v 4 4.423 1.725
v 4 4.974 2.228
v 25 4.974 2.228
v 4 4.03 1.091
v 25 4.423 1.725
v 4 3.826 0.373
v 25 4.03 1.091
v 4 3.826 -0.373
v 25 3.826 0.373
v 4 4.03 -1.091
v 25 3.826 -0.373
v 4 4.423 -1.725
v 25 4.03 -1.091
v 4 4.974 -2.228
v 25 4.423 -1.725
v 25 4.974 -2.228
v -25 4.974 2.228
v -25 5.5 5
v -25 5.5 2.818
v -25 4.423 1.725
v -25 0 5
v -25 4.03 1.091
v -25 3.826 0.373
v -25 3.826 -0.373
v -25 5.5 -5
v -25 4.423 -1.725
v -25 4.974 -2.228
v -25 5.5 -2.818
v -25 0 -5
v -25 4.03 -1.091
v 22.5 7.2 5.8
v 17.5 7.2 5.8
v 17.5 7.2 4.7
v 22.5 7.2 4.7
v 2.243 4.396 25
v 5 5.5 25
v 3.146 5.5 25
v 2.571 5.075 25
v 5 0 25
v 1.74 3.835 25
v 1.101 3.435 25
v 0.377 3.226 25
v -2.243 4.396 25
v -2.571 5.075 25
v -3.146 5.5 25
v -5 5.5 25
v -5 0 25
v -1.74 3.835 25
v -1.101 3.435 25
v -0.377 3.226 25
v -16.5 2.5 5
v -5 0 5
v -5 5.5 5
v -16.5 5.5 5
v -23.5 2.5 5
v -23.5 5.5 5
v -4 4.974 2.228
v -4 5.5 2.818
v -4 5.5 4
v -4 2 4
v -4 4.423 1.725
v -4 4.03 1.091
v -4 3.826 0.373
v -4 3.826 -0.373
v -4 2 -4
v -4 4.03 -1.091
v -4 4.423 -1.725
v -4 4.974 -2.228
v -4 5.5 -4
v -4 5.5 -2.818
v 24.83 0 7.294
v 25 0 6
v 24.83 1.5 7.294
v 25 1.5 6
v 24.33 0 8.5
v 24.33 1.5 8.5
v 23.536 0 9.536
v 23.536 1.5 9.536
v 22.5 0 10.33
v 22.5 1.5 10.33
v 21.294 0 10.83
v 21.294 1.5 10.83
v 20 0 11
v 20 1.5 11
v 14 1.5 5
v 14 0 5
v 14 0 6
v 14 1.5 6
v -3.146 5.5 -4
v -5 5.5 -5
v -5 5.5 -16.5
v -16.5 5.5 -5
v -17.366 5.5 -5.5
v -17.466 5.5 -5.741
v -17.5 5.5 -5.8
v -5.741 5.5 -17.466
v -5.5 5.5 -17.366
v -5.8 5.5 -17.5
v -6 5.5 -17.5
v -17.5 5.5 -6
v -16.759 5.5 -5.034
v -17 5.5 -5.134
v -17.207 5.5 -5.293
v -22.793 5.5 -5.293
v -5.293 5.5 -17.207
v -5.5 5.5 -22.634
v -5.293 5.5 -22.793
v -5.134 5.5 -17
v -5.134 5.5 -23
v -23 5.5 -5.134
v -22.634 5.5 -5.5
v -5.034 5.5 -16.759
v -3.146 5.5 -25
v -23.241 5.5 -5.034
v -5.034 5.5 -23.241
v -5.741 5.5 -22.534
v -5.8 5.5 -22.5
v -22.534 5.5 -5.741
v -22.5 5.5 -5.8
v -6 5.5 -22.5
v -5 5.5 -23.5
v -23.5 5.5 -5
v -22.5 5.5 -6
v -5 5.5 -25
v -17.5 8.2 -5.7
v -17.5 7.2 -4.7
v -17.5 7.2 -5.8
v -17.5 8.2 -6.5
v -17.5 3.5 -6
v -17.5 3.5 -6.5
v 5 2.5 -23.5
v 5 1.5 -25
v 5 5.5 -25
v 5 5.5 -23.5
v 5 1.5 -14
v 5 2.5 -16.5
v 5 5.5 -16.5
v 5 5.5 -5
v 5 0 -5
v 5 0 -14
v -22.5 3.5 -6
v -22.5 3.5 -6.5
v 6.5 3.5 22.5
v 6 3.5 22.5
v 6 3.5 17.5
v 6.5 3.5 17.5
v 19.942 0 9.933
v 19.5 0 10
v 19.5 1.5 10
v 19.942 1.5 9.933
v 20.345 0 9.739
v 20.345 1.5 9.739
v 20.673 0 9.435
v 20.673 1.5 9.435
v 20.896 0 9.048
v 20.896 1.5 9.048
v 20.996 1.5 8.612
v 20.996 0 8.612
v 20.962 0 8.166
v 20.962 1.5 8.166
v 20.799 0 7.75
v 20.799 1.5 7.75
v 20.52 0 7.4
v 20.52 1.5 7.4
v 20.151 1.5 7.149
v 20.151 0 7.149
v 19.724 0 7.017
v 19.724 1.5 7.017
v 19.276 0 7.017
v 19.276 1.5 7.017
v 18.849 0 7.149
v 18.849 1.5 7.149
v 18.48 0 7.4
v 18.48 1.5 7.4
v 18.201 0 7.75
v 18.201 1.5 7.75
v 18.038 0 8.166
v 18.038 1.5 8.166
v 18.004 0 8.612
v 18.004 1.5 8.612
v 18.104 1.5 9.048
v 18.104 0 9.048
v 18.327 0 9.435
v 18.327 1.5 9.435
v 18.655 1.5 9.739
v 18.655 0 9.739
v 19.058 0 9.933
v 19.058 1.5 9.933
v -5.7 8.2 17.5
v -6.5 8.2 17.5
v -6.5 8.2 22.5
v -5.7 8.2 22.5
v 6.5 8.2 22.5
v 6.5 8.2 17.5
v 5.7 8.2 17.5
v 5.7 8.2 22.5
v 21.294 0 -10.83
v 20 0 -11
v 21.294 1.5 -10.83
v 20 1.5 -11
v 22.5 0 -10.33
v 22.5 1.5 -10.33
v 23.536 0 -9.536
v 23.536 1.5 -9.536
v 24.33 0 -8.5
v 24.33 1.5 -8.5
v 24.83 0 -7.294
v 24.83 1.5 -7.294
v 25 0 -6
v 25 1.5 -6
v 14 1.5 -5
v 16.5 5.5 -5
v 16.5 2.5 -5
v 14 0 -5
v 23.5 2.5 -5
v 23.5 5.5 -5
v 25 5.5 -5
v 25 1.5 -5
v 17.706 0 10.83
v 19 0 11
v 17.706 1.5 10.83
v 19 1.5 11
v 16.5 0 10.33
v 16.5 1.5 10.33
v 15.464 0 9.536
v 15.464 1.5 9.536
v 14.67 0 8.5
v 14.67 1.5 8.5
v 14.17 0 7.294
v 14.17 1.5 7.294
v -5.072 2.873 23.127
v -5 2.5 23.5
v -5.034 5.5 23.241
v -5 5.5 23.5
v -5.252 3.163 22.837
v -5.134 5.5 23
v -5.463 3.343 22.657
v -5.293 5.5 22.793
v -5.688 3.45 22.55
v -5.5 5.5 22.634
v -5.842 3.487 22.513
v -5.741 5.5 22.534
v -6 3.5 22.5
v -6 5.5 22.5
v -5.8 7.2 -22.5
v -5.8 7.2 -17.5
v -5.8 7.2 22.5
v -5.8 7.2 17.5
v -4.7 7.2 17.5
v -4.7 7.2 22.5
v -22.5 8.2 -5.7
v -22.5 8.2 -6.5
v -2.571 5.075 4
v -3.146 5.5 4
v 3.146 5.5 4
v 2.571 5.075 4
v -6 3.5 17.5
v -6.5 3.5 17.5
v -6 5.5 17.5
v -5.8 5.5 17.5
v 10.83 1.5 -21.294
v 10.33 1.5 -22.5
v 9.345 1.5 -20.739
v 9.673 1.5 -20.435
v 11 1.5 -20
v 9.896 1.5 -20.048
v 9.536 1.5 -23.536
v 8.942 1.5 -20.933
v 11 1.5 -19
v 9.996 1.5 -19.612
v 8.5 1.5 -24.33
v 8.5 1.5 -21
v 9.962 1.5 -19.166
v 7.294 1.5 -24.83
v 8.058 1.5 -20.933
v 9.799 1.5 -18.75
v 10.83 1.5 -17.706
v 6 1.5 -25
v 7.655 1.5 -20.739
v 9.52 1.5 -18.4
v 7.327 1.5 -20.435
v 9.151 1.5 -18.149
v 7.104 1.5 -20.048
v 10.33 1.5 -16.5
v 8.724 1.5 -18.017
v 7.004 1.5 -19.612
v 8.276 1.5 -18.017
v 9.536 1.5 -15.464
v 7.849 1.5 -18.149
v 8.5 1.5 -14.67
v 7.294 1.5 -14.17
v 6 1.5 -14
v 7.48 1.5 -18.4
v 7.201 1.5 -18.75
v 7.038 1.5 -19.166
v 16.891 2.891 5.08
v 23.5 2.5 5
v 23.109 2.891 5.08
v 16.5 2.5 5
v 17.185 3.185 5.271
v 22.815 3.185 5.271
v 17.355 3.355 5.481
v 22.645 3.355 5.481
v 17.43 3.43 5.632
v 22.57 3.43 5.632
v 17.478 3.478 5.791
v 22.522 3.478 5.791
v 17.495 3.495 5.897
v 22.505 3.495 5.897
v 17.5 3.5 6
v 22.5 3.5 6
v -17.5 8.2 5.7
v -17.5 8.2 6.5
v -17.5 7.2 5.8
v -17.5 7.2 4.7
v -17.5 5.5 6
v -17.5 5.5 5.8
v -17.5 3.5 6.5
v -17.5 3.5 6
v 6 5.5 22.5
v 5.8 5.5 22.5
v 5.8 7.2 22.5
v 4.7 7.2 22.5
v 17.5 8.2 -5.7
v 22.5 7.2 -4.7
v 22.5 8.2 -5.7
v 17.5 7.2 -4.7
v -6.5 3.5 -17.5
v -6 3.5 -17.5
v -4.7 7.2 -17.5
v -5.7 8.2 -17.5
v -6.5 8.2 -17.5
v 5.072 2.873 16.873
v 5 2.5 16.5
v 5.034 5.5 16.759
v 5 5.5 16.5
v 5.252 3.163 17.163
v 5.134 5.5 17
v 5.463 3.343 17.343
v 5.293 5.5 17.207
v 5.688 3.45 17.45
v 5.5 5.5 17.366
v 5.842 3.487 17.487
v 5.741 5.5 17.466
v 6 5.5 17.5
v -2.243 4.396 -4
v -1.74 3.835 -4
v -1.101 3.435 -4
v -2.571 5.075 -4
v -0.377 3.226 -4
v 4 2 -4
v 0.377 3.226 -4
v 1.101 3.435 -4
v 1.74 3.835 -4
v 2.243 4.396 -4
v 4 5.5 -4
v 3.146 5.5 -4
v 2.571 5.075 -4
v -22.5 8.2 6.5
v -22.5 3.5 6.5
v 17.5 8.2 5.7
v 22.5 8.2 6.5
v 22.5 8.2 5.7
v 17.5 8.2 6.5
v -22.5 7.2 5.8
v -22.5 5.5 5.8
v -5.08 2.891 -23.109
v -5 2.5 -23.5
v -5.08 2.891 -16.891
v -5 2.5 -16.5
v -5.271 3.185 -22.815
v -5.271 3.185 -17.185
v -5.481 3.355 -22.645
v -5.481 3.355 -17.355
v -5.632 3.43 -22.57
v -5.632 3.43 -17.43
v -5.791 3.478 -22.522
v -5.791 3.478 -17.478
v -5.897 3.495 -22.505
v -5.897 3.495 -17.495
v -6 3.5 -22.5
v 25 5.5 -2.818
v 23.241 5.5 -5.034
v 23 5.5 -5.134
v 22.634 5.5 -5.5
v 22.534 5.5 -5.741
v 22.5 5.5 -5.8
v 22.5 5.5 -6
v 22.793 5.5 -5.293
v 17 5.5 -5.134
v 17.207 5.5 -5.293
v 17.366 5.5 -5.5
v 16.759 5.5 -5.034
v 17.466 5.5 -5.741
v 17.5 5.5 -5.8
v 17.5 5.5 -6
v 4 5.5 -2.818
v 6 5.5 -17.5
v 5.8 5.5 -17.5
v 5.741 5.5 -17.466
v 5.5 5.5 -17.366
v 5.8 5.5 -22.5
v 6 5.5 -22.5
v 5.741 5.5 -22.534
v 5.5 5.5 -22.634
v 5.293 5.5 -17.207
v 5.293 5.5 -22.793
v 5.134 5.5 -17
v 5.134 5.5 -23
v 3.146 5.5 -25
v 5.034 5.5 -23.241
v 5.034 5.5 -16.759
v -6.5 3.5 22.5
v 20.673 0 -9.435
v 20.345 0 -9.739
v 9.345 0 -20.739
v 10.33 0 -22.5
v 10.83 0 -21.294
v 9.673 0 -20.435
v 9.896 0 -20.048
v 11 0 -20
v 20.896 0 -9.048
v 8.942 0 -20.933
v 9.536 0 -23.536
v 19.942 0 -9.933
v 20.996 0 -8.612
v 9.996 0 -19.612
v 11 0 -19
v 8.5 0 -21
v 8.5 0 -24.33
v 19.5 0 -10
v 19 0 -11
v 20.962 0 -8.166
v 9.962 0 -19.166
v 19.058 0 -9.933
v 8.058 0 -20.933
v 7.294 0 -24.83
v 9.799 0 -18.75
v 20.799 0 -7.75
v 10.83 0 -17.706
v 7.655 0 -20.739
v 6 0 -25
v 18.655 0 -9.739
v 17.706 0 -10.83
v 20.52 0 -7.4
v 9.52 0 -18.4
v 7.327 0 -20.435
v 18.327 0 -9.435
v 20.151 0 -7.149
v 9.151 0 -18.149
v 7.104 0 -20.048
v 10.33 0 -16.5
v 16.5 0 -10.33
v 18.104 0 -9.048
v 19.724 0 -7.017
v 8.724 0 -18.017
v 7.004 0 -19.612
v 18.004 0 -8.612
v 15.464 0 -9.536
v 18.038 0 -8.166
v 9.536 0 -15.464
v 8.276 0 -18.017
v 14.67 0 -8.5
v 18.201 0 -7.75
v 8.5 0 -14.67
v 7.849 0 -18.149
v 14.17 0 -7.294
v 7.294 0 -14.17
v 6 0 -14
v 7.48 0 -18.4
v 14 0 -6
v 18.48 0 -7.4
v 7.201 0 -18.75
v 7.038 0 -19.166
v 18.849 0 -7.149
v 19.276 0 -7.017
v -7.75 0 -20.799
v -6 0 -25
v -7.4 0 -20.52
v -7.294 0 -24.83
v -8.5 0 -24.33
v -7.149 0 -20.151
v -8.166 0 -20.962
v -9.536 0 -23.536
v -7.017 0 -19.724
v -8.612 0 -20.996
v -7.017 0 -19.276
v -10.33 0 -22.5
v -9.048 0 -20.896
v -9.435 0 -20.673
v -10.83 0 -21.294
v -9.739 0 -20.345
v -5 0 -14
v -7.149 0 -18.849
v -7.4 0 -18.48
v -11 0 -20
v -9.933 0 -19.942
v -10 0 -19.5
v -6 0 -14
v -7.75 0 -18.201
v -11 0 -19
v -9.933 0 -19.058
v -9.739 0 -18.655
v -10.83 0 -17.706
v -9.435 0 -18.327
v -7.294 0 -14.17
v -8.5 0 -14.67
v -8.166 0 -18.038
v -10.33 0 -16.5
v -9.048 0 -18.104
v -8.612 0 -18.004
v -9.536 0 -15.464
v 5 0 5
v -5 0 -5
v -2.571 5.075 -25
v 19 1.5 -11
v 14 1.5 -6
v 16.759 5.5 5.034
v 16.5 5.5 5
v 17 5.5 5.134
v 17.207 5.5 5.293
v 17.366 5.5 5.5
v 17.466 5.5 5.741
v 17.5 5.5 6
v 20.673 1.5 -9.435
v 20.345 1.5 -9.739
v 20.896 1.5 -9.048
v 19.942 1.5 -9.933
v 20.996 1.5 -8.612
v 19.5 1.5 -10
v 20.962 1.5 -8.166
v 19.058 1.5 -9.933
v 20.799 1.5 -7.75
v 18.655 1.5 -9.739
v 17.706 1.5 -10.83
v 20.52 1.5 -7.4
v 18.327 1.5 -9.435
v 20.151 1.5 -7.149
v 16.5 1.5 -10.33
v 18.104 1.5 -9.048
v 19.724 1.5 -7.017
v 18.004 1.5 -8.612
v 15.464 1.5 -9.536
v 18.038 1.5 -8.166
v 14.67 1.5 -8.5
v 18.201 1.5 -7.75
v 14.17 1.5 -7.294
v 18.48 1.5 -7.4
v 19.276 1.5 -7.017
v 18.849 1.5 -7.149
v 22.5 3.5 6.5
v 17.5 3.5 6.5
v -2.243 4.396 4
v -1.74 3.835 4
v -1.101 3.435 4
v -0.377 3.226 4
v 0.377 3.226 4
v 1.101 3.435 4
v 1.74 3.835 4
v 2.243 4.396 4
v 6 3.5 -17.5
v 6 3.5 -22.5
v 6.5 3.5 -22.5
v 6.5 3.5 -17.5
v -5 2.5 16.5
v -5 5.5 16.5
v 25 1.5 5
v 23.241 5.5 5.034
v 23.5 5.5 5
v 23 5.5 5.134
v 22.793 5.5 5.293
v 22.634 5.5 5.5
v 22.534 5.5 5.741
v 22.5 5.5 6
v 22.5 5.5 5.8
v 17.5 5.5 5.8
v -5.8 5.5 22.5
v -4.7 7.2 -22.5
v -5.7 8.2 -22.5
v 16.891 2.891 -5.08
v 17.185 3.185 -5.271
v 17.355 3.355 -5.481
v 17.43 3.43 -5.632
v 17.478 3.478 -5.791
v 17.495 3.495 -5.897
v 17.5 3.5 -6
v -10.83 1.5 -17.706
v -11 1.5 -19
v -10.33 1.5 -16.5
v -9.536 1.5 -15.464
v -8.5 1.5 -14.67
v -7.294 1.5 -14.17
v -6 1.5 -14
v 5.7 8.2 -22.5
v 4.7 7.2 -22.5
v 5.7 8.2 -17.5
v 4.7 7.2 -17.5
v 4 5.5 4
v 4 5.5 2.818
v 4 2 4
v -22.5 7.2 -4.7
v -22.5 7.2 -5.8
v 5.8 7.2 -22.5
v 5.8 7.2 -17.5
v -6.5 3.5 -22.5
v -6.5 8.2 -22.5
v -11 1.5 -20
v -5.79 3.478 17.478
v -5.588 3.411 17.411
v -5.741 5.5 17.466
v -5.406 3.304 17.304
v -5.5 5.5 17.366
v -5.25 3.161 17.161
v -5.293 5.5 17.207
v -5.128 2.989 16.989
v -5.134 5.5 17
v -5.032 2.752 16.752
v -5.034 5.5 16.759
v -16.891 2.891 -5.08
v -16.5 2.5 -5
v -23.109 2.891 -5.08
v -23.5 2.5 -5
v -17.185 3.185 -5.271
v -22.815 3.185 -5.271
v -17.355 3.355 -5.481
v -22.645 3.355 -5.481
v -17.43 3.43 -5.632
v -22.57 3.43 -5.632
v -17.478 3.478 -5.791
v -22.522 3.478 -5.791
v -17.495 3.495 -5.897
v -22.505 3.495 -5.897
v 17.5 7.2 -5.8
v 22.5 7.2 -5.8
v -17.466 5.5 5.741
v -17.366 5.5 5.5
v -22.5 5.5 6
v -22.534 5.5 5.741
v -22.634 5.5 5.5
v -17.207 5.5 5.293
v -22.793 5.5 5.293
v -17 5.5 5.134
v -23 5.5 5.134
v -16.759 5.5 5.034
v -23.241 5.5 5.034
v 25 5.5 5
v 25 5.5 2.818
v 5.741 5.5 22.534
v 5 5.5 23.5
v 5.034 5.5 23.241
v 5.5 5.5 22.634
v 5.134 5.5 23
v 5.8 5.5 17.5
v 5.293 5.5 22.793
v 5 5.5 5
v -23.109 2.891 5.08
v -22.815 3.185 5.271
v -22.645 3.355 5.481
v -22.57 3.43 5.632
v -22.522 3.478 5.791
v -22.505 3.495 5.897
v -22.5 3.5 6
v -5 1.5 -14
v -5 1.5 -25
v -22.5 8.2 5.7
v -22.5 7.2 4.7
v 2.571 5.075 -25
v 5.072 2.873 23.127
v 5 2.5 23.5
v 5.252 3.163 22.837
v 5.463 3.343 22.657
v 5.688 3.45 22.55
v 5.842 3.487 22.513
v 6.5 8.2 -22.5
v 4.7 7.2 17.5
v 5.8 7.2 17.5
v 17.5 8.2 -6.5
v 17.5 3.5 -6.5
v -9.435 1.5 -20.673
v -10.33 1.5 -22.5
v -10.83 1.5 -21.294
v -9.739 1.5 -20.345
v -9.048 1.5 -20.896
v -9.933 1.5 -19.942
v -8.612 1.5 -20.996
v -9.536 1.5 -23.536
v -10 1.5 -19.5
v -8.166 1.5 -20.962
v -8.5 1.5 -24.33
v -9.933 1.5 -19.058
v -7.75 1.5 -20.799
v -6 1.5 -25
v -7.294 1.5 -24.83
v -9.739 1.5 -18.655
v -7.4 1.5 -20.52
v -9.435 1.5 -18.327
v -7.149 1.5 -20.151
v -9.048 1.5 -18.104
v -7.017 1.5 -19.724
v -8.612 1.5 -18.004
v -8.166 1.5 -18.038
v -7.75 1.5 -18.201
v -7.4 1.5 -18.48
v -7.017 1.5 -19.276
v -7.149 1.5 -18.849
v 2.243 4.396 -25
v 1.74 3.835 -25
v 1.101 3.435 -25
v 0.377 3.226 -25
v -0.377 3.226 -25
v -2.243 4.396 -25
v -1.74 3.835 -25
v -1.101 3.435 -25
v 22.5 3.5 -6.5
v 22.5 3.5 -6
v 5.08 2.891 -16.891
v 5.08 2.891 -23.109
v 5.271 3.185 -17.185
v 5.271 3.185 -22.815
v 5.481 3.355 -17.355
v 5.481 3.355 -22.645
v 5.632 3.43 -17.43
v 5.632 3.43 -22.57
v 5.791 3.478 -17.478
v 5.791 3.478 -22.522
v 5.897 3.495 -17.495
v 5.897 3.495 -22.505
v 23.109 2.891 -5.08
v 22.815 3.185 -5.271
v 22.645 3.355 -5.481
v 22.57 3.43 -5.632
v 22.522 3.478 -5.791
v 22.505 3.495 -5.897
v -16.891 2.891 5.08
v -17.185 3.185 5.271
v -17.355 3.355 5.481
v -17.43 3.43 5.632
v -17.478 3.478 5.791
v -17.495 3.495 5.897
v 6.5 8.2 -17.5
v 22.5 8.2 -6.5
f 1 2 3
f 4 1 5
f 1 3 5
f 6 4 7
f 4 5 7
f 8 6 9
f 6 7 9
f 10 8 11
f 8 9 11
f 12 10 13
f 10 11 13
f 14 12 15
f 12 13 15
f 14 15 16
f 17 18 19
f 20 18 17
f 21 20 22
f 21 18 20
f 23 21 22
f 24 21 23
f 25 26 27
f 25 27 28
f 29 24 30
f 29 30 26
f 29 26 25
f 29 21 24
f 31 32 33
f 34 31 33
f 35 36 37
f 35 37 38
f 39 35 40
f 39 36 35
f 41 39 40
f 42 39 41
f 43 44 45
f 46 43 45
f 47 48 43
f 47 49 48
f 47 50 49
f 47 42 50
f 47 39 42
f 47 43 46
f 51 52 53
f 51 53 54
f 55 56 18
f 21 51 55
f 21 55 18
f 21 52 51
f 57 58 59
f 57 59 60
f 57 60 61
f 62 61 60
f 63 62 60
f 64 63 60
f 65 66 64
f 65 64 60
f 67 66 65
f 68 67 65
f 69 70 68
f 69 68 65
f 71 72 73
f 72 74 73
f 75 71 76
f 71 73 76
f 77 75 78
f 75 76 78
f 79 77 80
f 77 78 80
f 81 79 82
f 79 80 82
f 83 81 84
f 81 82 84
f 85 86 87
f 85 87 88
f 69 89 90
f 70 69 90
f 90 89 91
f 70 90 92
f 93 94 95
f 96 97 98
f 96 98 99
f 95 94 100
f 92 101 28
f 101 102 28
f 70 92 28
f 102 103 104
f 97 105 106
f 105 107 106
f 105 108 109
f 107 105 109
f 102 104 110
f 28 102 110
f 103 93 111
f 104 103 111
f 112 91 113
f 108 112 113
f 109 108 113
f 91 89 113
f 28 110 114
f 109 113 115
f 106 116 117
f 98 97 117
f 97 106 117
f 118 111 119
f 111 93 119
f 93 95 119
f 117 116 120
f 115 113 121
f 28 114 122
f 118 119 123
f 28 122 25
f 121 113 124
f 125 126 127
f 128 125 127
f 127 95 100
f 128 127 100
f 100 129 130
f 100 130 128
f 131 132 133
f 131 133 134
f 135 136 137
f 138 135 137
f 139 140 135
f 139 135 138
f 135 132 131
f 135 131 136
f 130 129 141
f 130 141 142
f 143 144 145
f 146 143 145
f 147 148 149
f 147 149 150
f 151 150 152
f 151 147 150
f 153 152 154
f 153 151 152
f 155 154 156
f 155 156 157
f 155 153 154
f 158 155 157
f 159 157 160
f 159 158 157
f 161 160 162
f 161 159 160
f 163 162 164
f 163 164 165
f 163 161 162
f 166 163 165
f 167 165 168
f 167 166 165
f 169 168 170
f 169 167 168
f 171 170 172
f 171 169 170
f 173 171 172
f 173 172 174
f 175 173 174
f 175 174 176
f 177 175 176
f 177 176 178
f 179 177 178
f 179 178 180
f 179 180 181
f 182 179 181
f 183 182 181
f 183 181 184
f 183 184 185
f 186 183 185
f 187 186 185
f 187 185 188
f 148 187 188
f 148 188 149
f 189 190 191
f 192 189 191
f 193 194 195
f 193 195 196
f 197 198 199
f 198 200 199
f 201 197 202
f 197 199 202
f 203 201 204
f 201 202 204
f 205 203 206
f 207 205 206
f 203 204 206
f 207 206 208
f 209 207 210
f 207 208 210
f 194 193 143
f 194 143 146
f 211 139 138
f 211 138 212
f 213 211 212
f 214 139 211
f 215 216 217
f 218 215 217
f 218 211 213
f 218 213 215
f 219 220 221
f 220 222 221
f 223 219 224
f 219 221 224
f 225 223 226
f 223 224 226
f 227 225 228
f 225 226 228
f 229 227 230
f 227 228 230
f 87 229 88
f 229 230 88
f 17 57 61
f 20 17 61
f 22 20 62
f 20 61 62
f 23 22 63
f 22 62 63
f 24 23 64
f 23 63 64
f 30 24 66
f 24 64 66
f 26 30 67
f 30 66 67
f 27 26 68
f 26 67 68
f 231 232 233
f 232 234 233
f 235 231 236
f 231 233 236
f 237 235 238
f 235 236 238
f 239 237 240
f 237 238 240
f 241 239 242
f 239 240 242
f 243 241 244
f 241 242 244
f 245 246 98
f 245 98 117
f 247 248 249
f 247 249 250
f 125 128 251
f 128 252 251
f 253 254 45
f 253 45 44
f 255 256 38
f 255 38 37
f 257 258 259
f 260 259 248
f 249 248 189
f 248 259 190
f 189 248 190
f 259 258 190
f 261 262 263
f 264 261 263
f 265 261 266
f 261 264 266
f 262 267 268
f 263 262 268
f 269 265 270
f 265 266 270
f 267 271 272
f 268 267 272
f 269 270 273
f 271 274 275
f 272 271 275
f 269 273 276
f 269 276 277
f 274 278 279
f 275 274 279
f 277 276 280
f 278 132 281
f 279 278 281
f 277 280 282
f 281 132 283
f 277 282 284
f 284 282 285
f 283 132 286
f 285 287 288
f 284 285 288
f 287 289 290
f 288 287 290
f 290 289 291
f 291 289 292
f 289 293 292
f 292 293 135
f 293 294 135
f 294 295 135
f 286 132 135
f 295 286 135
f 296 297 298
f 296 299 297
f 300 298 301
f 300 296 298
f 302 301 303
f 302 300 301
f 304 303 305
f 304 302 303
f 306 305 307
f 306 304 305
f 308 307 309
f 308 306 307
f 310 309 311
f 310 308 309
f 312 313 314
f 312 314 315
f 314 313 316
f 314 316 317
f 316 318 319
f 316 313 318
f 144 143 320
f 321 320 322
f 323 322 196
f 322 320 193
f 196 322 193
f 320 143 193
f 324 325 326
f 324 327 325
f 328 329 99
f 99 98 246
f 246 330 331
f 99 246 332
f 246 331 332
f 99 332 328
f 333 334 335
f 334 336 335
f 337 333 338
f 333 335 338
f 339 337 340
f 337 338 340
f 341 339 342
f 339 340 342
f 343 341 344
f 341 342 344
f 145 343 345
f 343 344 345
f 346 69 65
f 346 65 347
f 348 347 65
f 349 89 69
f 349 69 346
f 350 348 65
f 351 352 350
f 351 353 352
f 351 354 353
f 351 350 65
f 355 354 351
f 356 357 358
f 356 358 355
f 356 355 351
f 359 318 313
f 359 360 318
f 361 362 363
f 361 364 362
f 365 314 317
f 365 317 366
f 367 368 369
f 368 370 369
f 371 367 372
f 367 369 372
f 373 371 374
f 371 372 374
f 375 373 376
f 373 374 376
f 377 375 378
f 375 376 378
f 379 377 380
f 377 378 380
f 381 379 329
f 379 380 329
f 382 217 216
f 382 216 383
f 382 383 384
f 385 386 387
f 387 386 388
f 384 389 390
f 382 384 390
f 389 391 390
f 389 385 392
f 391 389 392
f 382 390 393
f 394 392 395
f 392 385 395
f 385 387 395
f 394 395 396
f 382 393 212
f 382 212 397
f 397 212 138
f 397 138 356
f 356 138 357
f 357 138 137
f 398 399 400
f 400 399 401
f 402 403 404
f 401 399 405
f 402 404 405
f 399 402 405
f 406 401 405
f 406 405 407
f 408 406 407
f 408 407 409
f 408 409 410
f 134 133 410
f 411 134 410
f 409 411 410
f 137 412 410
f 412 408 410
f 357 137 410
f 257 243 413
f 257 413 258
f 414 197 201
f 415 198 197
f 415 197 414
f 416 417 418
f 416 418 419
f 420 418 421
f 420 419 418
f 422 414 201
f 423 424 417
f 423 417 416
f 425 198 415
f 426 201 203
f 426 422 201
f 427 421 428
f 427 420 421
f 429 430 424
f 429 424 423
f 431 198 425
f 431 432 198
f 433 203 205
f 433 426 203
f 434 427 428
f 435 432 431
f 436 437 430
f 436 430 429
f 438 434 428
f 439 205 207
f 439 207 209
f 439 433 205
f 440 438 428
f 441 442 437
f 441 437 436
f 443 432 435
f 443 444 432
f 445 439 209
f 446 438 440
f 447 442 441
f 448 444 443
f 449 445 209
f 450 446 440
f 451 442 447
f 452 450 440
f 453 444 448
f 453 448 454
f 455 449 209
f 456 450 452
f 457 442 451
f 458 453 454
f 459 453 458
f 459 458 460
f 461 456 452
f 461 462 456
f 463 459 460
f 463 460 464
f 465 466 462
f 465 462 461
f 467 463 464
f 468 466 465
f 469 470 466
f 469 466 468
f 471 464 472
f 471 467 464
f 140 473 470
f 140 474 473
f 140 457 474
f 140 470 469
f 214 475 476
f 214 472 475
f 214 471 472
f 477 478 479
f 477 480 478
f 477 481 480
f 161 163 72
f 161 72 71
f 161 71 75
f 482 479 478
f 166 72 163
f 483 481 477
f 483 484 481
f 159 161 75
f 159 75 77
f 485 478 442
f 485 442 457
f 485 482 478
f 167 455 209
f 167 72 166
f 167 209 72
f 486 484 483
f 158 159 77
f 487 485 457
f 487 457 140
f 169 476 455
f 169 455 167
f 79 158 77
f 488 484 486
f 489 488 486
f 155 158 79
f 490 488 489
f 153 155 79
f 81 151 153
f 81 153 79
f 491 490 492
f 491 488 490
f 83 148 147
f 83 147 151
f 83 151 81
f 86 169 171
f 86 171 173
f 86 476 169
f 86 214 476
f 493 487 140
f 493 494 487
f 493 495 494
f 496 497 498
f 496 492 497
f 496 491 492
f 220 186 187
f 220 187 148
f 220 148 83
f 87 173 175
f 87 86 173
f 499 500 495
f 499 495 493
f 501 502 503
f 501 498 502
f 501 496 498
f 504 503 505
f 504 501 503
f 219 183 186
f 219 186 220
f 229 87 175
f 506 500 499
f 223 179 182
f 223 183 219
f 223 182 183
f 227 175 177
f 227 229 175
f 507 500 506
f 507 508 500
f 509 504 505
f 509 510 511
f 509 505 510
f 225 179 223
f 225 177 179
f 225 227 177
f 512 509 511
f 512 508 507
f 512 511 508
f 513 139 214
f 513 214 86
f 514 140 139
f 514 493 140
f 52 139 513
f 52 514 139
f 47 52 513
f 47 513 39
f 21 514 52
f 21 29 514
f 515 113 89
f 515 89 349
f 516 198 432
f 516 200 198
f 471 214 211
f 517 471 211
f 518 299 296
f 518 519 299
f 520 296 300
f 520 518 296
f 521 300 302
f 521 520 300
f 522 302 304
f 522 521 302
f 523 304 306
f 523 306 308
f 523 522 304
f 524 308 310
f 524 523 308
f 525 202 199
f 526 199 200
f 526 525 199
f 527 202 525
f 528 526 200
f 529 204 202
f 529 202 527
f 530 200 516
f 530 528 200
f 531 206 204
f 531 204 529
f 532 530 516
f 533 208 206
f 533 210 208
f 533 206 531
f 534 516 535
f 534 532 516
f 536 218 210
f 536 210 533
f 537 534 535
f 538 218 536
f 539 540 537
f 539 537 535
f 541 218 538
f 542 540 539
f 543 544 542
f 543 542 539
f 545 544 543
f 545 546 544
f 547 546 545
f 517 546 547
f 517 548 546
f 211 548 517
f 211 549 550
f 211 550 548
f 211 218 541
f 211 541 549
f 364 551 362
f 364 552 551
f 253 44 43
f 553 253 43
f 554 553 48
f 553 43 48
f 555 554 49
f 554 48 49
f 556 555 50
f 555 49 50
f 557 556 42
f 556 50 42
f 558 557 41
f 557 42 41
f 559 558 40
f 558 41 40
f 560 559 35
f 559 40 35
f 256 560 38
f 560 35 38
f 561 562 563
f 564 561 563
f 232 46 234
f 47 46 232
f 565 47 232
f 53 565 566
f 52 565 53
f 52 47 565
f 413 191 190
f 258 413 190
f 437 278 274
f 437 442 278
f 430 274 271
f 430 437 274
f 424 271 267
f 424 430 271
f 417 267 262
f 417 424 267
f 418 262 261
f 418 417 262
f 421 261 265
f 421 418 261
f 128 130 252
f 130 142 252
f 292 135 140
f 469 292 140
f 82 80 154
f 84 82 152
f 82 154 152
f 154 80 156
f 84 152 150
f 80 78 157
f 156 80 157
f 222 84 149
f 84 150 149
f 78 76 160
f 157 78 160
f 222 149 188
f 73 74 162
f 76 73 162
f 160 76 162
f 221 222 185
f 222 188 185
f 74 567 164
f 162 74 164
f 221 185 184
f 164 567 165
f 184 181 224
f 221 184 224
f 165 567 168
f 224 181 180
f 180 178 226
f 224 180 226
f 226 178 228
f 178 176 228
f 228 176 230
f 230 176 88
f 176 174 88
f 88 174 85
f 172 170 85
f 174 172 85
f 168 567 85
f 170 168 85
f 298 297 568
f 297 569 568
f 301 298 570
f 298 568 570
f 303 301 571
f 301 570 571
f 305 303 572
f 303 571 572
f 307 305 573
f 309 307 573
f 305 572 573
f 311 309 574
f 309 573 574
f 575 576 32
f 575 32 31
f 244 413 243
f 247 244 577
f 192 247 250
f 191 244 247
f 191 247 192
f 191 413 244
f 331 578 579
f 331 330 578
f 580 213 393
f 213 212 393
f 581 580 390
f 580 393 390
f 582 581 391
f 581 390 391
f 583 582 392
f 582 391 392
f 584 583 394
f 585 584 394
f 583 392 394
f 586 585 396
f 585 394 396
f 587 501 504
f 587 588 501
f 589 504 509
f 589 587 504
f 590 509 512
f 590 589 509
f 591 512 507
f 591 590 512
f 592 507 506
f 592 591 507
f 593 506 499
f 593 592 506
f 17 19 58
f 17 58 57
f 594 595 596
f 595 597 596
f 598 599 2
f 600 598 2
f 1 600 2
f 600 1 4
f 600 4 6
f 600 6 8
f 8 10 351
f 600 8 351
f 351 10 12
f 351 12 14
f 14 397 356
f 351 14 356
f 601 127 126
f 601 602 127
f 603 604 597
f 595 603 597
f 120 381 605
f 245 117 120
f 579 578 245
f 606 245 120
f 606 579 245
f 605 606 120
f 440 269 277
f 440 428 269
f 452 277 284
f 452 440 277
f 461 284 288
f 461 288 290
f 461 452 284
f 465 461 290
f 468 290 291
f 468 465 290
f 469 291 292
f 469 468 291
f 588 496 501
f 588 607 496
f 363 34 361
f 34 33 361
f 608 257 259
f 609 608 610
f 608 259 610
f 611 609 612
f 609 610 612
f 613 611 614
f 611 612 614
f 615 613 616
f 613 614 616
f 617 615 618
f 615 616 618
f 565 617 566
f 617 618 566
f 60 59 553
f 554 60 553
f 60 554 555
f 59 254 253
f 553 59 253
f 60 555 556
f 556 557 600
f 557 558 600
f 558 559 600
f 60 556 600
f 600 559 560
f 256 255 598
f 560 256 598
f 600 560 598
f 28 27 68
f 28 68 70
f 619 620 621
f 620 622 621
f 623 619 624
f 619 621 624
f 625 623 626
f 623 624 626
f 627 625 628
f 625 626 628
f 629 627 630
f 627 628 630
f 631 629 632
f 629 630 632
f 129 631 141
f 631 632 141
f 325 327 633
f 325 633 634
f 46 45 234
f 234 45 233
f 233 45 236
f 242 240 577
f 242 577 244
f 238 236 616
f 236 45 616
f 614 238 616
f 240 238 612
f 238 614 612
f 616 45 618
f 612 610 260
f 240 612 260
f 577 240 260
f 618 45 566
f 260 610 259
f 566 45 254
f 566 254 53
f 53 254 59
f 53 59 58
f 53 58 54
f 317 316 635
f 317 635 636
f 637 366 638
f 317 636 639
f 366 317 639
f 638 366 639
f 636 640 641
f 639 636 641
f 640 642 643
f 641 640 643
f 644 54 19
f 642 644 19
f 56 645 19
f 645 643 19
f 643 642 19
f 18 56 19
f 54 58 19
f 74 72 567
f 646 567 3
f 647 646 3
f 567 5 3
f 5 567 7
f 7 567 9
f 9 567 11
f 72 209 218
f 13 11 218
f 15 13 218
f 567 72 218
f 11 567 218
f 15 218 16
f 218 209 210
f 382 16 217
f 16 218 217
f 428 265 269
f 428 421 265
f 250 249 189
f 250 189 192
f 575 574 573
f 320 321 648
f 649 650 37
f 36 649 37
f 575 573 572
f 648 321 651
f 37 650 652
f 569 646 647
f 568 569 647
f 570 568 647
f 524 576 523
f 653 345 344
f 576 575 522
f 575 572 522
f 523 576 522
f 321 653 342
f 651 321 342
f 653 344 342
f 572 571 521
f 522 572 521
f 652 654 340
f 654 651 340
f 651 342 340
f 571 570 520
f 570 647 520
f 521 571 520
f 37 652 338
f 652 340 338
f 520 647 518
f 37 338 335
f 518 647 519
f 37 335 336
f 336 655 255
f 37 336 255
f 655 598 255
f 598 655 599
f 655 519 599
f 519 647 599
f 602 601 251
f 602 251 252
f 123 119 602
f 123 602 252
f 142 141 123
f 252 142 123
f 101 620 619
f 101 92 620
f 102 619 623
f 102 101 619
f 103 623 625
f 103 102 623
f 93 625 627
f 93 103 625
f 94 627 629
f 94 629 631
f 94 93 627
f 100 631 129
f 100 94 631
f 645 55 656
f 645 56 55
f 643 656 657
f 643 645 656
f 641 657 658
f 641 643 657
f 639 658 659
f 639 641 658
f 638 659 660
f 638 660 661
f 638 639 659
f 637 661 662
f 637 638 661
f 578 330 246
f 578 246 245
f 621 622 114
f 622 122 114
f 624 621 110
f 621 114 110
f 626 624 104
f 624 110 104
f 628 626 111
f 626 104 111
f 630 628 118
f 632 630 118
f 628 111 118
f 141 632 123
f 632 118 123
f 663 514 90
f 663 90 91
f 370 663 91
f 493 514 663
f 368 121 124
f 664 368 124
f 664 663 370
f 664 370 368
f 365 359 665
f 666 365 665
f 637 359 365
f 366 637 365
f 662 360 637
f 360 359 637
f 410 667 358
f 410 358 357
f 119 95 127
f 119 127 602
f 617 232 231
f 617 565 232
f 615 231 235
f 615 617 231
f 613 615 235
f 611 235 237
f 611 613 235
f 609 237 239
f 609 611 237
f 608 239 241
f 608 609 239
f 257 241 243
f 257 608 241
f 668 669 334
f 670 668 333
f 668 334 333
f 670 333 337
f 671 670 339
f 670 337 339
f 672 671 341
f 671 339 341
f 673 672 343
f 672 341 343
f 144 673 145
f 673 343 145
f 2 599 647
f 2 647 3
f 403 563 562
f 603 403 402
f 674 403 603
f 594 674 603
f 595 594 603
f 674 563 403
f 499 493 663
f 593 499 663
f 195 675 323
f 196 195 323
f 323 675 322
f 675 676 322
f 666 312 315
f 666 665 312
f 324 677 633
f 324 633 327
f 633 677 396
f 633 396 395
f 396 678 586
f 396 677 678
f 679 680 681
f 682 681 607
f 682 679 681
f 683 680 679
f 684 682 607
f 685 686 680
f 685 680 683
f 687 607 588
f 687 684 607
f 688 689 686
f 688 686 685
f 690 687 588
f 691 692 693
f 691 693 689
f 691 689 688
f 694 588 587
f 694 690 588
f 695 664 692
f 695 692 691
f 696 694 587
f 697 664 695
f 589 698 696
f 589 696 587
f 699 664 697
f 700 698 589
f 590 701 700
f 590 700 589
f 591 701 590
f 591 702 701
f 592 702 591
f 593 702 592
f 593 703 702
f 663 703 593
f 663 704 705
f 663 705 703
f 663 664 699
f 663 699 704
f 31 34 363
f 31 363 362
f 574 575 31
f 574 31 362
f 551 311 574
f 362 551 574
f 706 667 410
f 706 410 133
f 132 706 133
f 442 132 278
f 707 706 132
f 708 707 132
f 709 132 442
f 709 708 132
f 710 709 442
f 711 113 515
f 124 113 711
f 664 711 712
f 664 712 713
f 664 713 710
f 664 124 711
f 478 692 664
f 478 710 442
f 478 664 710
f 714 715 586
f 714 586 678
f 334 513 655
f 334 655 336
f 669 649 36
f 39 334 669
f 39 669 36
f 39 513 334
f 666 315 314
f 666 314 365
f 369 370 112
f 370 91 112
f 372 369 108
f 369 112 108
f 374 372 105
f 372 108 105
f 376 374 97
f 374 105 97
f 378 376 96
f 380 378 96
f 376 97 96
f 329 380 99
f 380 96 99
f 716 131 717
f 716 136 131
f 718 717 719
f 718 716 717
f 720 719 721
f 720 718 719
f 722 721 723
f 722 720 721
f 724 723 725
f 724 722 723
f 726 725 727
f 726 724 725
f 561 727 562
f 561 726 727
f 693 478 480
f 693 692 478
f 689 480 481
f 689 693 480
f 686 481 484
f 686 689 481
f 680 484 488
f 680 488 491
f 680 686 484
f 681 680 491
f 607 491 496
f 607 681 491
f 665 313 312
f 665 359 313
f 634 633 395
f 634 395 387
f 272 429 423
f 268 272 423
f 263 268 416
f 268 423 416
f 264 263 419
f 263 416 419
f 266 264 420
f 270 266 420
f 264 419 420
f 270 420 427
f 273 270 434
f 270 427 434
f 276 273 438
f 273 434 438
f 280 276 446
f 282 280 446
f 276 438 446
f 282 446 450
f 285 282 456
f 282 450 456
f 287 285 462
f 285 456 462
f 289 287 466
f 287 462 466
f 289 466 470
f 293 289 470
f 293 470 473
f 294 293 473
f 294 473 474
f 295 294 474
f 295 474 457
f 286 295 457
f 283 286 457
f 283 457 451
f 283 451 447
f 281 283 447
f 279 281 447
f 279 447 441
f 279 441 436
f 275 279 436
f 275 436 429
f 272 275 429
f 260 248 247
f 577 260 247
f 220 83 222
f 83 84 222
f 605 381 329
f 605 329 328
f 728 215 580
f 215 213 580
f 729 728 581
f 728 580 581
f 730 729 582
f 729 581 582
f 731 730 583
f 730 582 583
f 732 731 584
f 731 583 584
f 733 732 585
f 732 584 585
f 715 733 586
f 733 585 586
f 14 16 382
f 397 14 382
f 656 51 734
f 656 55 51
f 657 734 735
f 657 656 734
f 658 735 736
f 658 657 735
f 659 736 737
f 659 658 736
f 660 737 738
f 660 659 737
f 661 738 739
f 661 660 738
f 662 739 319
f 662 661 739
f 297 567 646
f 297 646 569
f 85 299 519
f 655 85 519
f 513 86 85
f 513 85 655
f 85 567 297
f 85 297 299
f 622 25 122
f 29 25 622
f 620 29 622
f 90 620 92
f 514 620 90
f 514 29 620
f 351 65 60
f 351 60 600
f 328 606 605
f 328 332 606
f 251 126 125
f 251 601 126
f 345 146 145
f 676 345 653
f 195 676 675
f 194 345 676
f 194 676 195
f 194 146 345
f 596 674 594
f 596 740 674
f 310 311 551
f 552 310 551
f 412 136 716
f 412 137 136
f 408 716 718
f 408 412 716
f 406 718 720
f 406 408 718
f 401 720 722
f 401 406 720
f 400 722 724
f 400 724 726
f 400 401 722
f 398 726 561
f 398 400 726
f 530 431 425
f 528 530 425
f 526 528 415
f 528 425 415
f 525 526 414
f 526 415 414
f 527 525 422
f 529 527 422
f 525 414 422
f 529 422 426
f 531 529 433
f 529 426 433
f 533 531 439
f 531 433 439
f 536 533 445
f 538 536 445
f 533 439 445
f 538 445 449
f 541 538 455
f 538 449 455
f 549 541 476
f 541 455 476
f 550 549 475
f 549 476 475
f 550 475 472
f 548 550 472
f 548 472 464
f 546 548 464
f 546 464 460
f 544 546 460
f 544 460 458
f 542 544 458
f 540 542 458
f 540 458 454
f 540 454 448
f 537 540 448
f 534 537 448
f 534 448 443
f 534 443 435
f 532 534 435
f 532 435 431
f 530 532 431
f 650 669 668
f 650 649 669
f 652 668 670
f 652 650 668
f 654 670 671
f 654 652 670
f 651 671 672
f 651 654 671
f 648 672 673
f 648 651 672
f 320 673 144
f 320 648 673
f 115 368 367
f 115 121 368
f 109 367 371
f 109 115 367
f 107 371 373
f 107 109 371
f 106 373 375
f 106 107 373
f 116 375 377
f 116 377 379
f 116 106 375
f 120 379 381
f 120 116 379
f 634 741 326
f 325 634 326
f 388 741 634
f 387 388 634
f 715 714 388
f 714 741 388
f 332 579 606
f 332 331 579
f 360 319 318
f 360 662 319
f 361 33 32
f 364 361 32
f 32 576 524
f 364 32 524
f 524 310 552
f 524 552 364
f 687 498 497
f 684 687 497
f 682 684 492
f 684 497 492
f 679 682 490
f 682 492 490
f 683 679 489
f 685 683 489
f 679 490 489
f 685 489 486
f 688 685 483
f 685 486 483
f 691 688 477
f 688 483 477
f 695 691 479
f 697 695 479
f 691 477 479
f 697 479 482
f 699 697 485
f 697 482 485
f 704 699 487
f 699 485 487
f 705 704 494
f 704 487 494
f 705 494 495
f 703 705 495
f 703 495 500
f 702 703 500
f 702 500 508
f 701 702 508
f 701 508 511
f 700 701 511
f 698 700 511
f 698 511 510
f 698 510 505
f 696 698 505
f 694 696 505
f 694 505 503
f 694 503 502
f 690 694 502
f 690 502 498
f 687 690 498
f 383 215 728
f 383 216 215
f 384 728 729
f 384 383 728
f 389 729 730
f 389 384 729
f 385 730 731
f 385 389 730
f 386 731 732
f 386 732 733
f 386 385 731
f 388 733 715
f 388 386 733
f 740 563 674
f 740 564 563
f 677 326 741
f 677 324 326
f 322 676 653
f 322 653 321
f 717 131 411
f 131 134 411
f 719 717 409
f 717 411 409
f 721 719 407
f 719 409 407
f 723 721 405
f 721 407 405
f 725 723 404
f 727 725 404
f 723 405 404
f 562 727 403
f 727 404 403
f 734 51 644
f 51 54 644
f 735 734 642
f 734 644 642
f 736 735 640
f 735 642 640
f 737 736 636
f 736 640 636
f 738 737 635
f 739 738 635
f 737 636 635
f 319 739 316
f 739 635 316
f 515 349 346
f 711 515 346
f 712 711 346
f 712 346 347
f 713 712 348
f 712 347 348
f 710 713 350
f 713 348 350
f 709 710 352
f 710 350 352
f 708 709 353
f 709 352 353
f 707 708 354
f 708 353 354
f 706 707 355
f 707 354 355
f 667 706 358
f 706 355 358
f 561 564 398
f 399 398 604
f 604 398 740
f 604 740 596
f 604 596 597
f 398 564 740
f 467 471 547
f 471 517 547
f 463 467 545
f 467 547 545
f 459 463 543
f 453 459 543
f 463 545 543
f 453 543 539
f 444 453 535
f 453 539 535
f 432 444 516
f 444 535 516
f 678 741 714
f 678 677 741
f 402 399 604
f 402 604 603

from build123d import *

# Parameters (mm, degrees)
BOSS_EXTRUDE5_DEPTH          = 5.5
CUT_EXTRUDE1_REACH           = 58.172
SKETCH4_R                    = 2.7
SKETCH5_R                    = 2.7
CUT_EXTRUDE2_DEPTH           = 57.171612047
SKETCH6_W                    = 8
SKETCH6_H                    = 8
CUT_EXTRUDE3_DEPTH           = 3.5
SKETCH7_W                    = 5
SKETCH7_H                    = 4.7
BOSS_EXTRUDE6_DEPTH          = 1.5
SKETCH8_W                    = 5
SKETCH8_H                    = 1
BOSS_EXTRUDE7_DEPTH          = 0.3
CHAMFER1_SIZE                = 1
CHAMFER1_OF_MIRROR2_SIZE     = 1
FILLET2_R                    = 1
SKETCH13_W                   = 5
SKETCH13_H                   = 1.7
CUT_EXTRUDE6_DEPTH           = 0.8
SKETCH9_W                    = 11
SKETCH9_H                    = 1.5
BOSS_EXTRUDE8_DEPTH          = 6
CUT_EXTRUDE5_REACH           = 38.294
SKETCH11_R                   = 1.5
CIRPATTERN12_COUNT           = 2
CIRPATTERN12_ANGLE           = 90
CIRPATTERN12_COPY_1_SKETCH_W = 11
CIRPATTERN12_COPY_1_SKETCH_H = 1.5
CIRPATTERN12_COPY_1_DEPTH    = 6
CIRPATTERN12_COPY_2_REACH    = 38.294
CIRPATTERN12_COPY_2_SKETCH_R = 1.5
FILLET4_R                    = 5
CIRPATTERN14_COUNT           = 4
CIRPATTERN14_COPY_1_SKETCH_W = 5
CIRPATTERN14_COPY_1_SKETCH_H = 1.7
CIRPATTERN14_COPY_1_DEPTH    = 0.8
CIRPATTERN14_COPY_2_SKETCH_W = 5
CIRPATTERN14_COPY_2_SKETCH_H = 1.7
CIRPATTERN14_COPY_2_DEPTH    = 0.8
CIRPATTERN14_COPY_3_SKETCH_W = 5
CIRPATTERN14_COPY_3_SKETCH_H = 1.7
CIRPATTERN14_COPY_3_DEPTH    = 0.8
CHAMFER2_START               = -26
CHAMFER2_DEPTH               = 52
CHAMFER2_2_DEPTH             = 52


with BuildPart() as part:
    # Sketch3 → Boss-Extrude5 (new body)
    with BuildSketch(Plane(origin=(0, 0, 0), x_dir=(1, 0, 0), z_dir=(0, 1, 0))):
        Polygon((5, 5), (25, 5), (25, -5), (5, -5), (5, -25), (-5, -25), (-5, -5), (-25, -5), (-25, 5), (-5, 5), (-5, 25), (5, 25), align=None)
    extrude(amount=BOSS_EXTRUDE5_DEPTH)

    # Sketch4 → Cut-Extrude1 (cut, up to next)
    with BuildSketch(Plane.XY.offset(25), mode=Mode.PRIVATE) as cut_extrude1_sk1:
        with Locations((0, 5.9)):
            Circle(SKETCH4_R)
    cut_extrude1_tool1 = extrude(cut_extrude1_sk1.sketch, amount=-CUT_EXTRUDE1_REACH, mode=Mode.PRIVATE) & part.part
    add(cut_extrude1_tool1.solids().sort_by_distance((0, 5.9, 25))[0], mode=Mode.SUBTRACT)

    # Sketch5 → Cut-Extrude2 (cut, through all)
    with BuildSketch(Plane(origin=(25, 0, 0), x_dir=(0, 0, -1), z_dir=(1, 0, 0))):
        with Locations((0, 6.5)):
            Circle(SKETCH5_R)
    extrude(amount=-CUT_EXTRUDE2_DEPTH, mode=Mode.SUBTRACT)

    # Sketch6 → Cut-Extrude3 (cut)
    with BuildSketch(Plane(origin=(0, 5.5, 0), x_dir=(1, 0, 0), z_dir=(0, 1, 0))):
        Rectangle(SKETCH6_W, SKETCH6_H)
    extrude(amount=-CUT_EXTRUDE3_DEPTH, mode=Mode.SUBTRACT)

    # Sketch7 → Boss-Extrude6 (add)
    with BuildSketch(Plane(origin=(5, 0, 0), x_dir=(0, 0, -1), z_dir=(1, 0, 0))):
        with Locations((-20, 5.85)):
            Rectangle(SKETCH7_W, SKETCH7_H)
    boss_extrude6 = extrude(amount=BOSS_EXTRUDE6_DEPTH)

    # Sketch8 → Boss-Extrude7 (add)
    with BuildSketch(Plane.ZY.offset(-5)):
        with Locations((20, 7.7)):
            Rectangle(SKETCH8_W, SKETCH8_H)
    boss_extrude7 = extrude(amount=BOSS_EXTRUDE7_DEPTH)

    # Chamfer1
    chamfer1_edges = [part.edges().sort_by_distance(p)[0] for p in [
        (4.7, 8.2, 20),
    ]]
    chamfer(chamfer1_edges, length=CHAMFER1_SIZE - 0.0001)  # a hair under: the kernel refuses the full size

    # Mirror2: Boss-Extrude6, Boss-Extrude7 across plane
    add(boss_extrude6.mirror(Plane(origin=(0, 0, 0), x_dir=(0, 0, 1), z_dir=(1, 0, 0))))
    add(boss_extrude7.mirror(Plane(origin=(0, 0, 0), x_dir=(0, 0, 1), z_dir=(1, 0, 0))))

    # Chamfer1 of Mirror2
    chamfer1_of_mirror2_edges = [part.edges().sort_by_distance(p)[0] for p in [
        (-4.7, 8.2, 20),
    ]]
    chamfer(chamfer1_of_mirror2_edges, length=CHAMFER1_OF_MIRROR2_SIZE - 0.0001)  # a hair under: the kernel refuses the full size

    # CirPattern6: read off the stored shape, not the designer's step
    # CirPattern6: loft between two sections, ruled curve by curve
    cirpattern6_from = [
        Edge.make_line((-17.5, 7.2, 5), (-17.5, 5.5, 5)),
        Edge.make_line((-17.5, 8.2, 6.5), (-17.5, 8.2, 5.7)),
        Edge.make_line((-17.5, 3.5, 5), (-17.5, 3.5, 6.5)),
        Edge.make_line((-17.5, 7.2, 5), (-17.5, 7.2, 4.7)),
        Edge.make_line((-17.5, 3.5, 6.5), (-17.5, 8.2, 6.5)),
        Edge.make_line((-17.5, 8.2, 5.7), (-17.5, 7.2, 4.7)),
        Edge.make_line((-17.5, 3.5, 5), (-17.5, 5.5, 5)),
    ]
    cirpattern6_to = [
        Edge.make_line((-22.5, 7.2, 5), (-22.5, 5.5, 5)),
        Edge.make_line((-22.5, 8.2, 6.5), (-22.5, 8.2, 5.7)),
        Edge.make_line((-22.5, 3.5, 5), (-22.5, 3.5, 6.5)),
        Edge.make_line((-22.5, 7.2, 5), (-22.5, 7.2, 4.7)),
        Edge.make_line((-22.5, 3.5, 6.5), (-22.5, 8.2, 6.5)),
        Edge.make_line((-22.5, 8.2, 5.7), (-22.5, 7.2, 4.7)),
        Edge.make_line((-22.5, 3.5, 5), (-22.5, 5.5, 5)),
    ]
    cirpattern6 = Solid(Shell([*[Face.make_surface_from_curves(cirpattern6_from[k], cirpattern6_to[k]) for k in range(7)], Face(Wire(cirpattern6_from)), Face(Wire(cirpattern6_to))]))
    add(cirpattern6)

    # CirPattern6 2: loft between two sections, ruled curve by curve
    cirpattern6_2_from = [
        Edge.make_line((22.5, 5.5, 5), (22.5, 7.2, 5)),
        Edge.make_line((22.5, 8.2, 6.5), (22.5, 8.2, 5.7)),
        Edge.make_line((22.5, 3.5, 5), (22.5, 3.5, 6.5)),
        Edge.make_line((22.5, 7.2, 5), (22.5, 7.2, 4.7)),
        Edge.make_line((22.5, 3.5, 6.5), (22.5, 8.2, 6.5)),
        Edge.make_line((22.5, 7.2, 4.7), (22.5, 8.2, 5.7)),
        Edge.make_line((22.5, 3.5, 5), (22.5, 5.5, 5)),
    ]
    cirpattern6_2_to = [
        Edge.make_line((17.5, 5.5, 5), (17.5, 7.2, 5)),
        Edge.make_line((17.5, 8.2, 6.5), (17.5, 8.2, 5.7)),
        Edge.make_line((17.5, 3.5, 5), (17.5, 3.5, 6.5)),
        Edge.make_line((17.5, 7.2, 5), (17.5, 7.2, 4.7)),
        Edge.make_line((17.5, 3.5, 6.5), (17.5, 8.2, 6.5)),
        Edge.make_line((17.5, 7.2, 4.7), (17.5, 8.2, 5.7)),
        Edge.make_line((17.5, 3.5, 5), (17.5, 5.5, 5)),
    ]
    cirpattern6_2 = Solid(Shell([*[Face.make_surface_from_curves(cirpattern6_2_from[k], cirpattern6_2_to[k]) for k in range(7)], Face(Wire(cirpattern6_2_from)), Face(Wire(cirpattern6_2_to))]))
    add(cirpattern6_2)

    # CirPattern6 3: loft between two sections, ruled curve by curve
    cirpattern6_3_from = [
        Edge.make_line((-5, 7.2, -22.5), (-5, 5.5, -22.5)),
        Edge.make_line((-5.7, 8.2, -22.5), (-6.5, 8.2, -22.5)),
        Edge.make_line((-5, 3.5, -22.5), (-6.5, 3.5, -22.5)),
        Edge.make_line((-5, 7.2, -22.5), (-4.7, 7.2, -22.5)),
        Edge.make_line((-6.5, 8.2, -22.5), (-6.5, 3.5, -22.5)),
        Edge.make_line((-4.7, 7.2, -22.5), (-5.7, 8.2, -22.5)),
        Edge.make_line((-5, 3.5, -22.5), (-5, 5.5, -22.5)),
    ]
    cirpattern6_3_to = [
        Edge.make_line((-5, 7.2, -17.5), (-5, 5.5, -17.5)),
        Edge.make_line((-5.7, 8.2, -17.5), (-6.5, 8.2, -17.5)),
        Edge.make_line((-5, 3.5, -17.5), (-6.5, 3.5, -17.5)),
        Edge.make_line((-5, 7.2, -17.5), (-4.7, 7.2, -17.5)),
        Edge.make_line((-6.5, 8.2, -17.5), (-6.5, 3.5, -17.5)),
        Edge.make_line((-4.7, 7.2, -17.5), (-5.7, 8.2, -17.5)),
        Edge.make_line((-5, 3.5, -17.5), (-5, 5.5, -17.5)),
    ]
    cirpattern6_3 = Solid(Shell([*[Face.make_surface_from_curves(cirpattern6_3_from[k], cirpattern6_3_to[k]) for k in range(7)], Face(Wire(cirpattern6_3_from)), Face(Wire(cirpattern6_3_to))]))
    add(cirpattern6_3)

    # CirPattern6 4: loft between two sections, ruled curve by curve
    cirpattern6_4_from = [
        Edge.make_line((22.5, 7.2, -5), (22.5, 5.5, -5)),
        Edge.make_line((22.5, 8.2, -5.7), (22.5, 8.2, -6.5)),
        Edge.make_line((22.5, 3.5, -5), (22.5, 3.5, -6.5)),
        Edge.make_line((22.5, 7.2, -5), (22.5, 7.2, -4.7)),
        Edge.make_line((22.5, 8.2, -6.5), (22.5, 3.5, -6.5)),
        Edge.make_line((22.5, 7.2, -4.7), (22.5, 8.2, -5.7)),
        Edge.make_line((22.5, 3.5, -5), (22.5, 5.5, -5)),
    ]
    cirpattern6_4_to = [
        Edge.make_line((17.5, 7.2, -5), (17.5, 5.5, -5)),
        Edge.make_line((17.5, 8.2, -5.7), (17.5, 8.2, -6.5)),
        Edge.make_line((17.5, 3.5, -5), (17.5, 3.5, -6.5)),
        Edge.make_line((17.5, 7.2, -5), (17.5, 7.2, -4.7)),
        Edge.make_line((17.5, 8.2, -6.5), (17.5, 3.5, -6.5)),
        Edge.make_line((17.5, 7.2, -4.7), (17.5, 8.2, -5.7)),
        Edge.make_line((17.5, 3.5, -5), (17.5, 5.5, -5)),
    ]
    cirpattern6_4 = Solid(Shell([*[Face.make_surface_from_curves(cirpattern6_4_from[k], cirpattern6_4_to[k]) for k in range(7)], Face(Wire(cirpattern6_4_from)), Face(Wire(cirpattern6_4_to))]))
    add(cirpattern6_4)

    # CirPattern6 5: loft between two sections, ruled curve by curve
    cirpattern6_5_from = [
        Edge.make_line((-17.5, 5.5, -5), (-17.5, 7.2, -5)),
        Edge.make_line((-17.5, 8.2, -6.5), (-17.5, 8.2, -5.7)),
        Edge.make_line((-17.5, 3.5, -5), (-17.5, 3.5, -6.5)),
        Edge.make_line((-17.5, 7.2, -5), (-17.5, 7.2, -4.7)),
        Edge.make_line((-17.5, 3.5, -6.5), (-17.5, 8.2, -6.5)),
        Edge.make_line((-17.5, 7.2, -4.7), (-17.5, 8.2, -5.7)),
        Edge.make_line((-17.5, 3.5, -5), (-17.5, 5.5, -5)),
    ]
    cirpattern6_5_to = [
        Edge.make_line((-22.5, 5.5, -5), (-22.5, 7.2, -5)),
        Edge.make_line((-22.5, 8.2, -6.5), (-22.5, 8.2, -5.7)),
        Edge.make_line((-22.5, 3.5, -5), (-22.5, 3.5, -6.5)),
        Edge.make_line((-22.5, 7.2, -5), (-22.5, 7.2, -4.7)),
        Edge.make_line((-22.5, 3.5, -6.5), (-22.5, 8.2, -6.5)),
        Edge.make_line((-22.5, 7.2, -4.7), (-22.5, 8.2, -5.7)),
        Edge.make_line((-22.5, 3.5, -5), (-22.5, 5.5, -5)),
    ]
    cirpattern6_5 = Solid(Shell([*[Face.make_surface_from_curves(cirpattern6_5_from[k], cirpattern6_5_to[k]) for k in range(7)], Face(Wire(cirpattern6_5_from)), Face(Wire(cirpattern6_5_to))]))
    add(cirpattern6_5)

    # CirPattern6 6: loft between two sections, ruled curve by curve
    cirpattern6_6_from = [
        Edge.make_line((5, 5.5, -22.5), (5, 7.2, -22.5)),
        Edge.make_line((6.5, 8.2, -22.5), (5.7, 8.2, -22.5)),
        Edge.make_line((5, 3.5, -22.5), (6.5, 3.5, -22.5)),
        Edge.make_line((6.5, 3.5, -22.5), (6.5, 8.2, -22.5)),
        Edge.make_line((5, 7.2, -22.5), (4.7, 7.2, -22.5)),
        Edge.make_line((4.7, 7.2, -22.5), (5.7, 8.2, -22.5)),
        Edge.make_line((5, 3.5, -22.5), (5, 5.5, -22.5)),
    ]
    cirpattern6_6_to = [
        Edge.make_line((5, 5.5, -17.5), (5, 7.2, -17.5)),
        Edge.make_line((6.5, 8.2, -17.5), (5.7, 8.2, -17.5)),
        Edge.make_line((5, 3.5, -17.5), (6.5, 3.5, -17.5)),
        Edge.make_line((6.5, 3.5, -17.5), (6.5, 8.2, -17.5)),
        Edge.make_line((5, 7.2, -17.5), (4.7, 7.2, -17.5)),
        Edge.make_line((4.7, 7.2, -17.5), (5.7, 8.2, -17.5)),
        Edge.make_line((5, 3.5, -17.5), (5, 5.5, -17.5)),
    ]
    cirpattern6_6 = Solid(Shell([*[Face.make_surface_from_curves(cirpattern6_6_from[k], cirpattern6_6_to[k]) for k in range(7)], Face(Wire(cirpattern6_6_from)), Face(Wire(cirpattern6_6_to))]))
    add(cirpattern6_6)

    # Fillet2
    fillet2_edges = [part.edges().sort_by_distance(p)[0] for p in [
        (-5, 4.5, 22.5),
        (-5, 4.5, 17.5),
        (-5, 3.5, 20),
        (22.5, 4.5, 5),
        (17.5, 4.5, 5),
        (20, 3.5, 5),
        (5, 4.5, -17.5),
        (5, 4.5, -22.5),
        (5, 3.5, -20),
        (-22.5, 4.5, -5),
        (-17.5, 4.5, -5),
        (-20, 3.5, -5),
        (17.5, 4.5, -5),
        (22.5, 4.5, -5),
        (20, 3.5, -5),
        (-5, 4.5, -22.5),
        (-5, 4.5, -17.5),
        (-5, 3.5, -20),
        (-22.5, 4.5, 5),
        (-17.5, 4.5, 5),
        (-20, 3.5, 5),
        (5, 4.5, 22.5),
        (5, 4.5, 17.5),
        (5, 3.5, 20),
    ]]
    fillet(fillet2_edges, radius=FILLET2_R)

    # Sketch13 → Cut-Extrude6 (cut)
    with BuildSketch(Plane.ZY.offset(-5)):
        with Locations((20, 6.35)):
            Rectangle(SKETCH13_W, SKETCH13_H)
    cut_extrude6 = extrude(amount=-CUT_EXTRUDE6_DEPTH, mode=Mode.SUBTRACT)

    # Sketch9 → Boss-Extrude8 (add)
    with BuildSketch(Plane(origin=(0, 0, -5), x_dir=(-1, 0, 0), z_dir=(0, 0, -1))):
        with Locations((-19.5, 0.75)):
            Rectangle(SKETCH9_W, SKETCH9_H)
    boss_extrude8 = extrude(amount=BOSS_EXTRUDE8_DEPTH)

    # Sketch11 → Cut-Extrude5 (cut, up to next)
    with BuildSketch(Plane.XZ, mode=Mode.PRIVATE) as cut_extrude5_sk1:
        with Locations(Location((19.5, -8.5, 0), (0, 0, 270))):
            Circle(SKETCH11_R)
    cut_extrude5_tool1 = extrude(cut_extrude5_sk1.sketch, amount=-CUT_EXTRUDE5_REACH, mode=Mode.PRIVATE) & part.part
    cut_extrude5 = cut_extrude5_tool1.solids().sort_by_distance((19.5, 0, -8.5))[0]
    add(cut_extrude5, mode=Mode.SUBTRACT)

    # Mirror3: Boss-Extrude8, Cut-Extrude5 across plane
    add(boss_extrude8.mirror(Plane.XY))
    add(cut_extrude5.mirror(Plane.XY), mode=Mode.SUBTRACT)

    # CirPattern12: Boss-Extrude8, Cut-Extrude5 ×2 about axis
    cirpattern12_axis = Axis((0, 0, 0), (0, 1, 0))
    add([boss_extrude8.rotate(cirpattern12_axis, i * CIRPATTERN12_ANGLE / (CIRPATTERN12_COUNT - 1)) for i in range(1, CIRPATTERN12_COUNT)])
    add([cut_extrude5.rotate(cirpattern12_axis, i * CIRPATTERN12_ANGLE / (CIRPATTERN12_COUNT - 1)) for i in range(1, CIRPATTERN12_COUNT)], mode=Mode.SUBTRACT)

    # CirPattern12 copy 1 sketch → CirPattern12 copy 1 (add)
    with BuildSketch(Plane(origin=(5, 0, 0), x_dir=(0, 0, 1), z_dir=(1, 0, 0))):
        with Locations((-19.5, -0.75)):
            Rectangle(CIRPATTERN12_COPY_1_SKETCH_W, CIRPATTERN12_COPY_1_SKETCH_H)
    extrude(amount=CIRPATTERN12_COPY_1_DEPTH)

    # CirPattern12 copy 2 sketch → CirPattern12 copy 2 (cut, up to next)
    with BuildSketch(Plane(origin=(0, 0, 0), x_dir=(0, 0, -1), z_dir=(0, -1, 0)), mode=Mode.PRIVATE) as cirpattern12_copy_2_sk1:
        with Locations((19.5, 8.5)):
            Circle(CIRPATTERN12_COPY_2_SKETCH_R)
    cirpattern12_copy_2_tool1 = extrude(cirpattern12_copy_2_sk1.sketch, amount=-CIRPATTERN12_COPY_2_REACH, mode=Mode.PRIVATE) & part.part
    add(cirpattern12_copy_2_tool1.solids().sort_by_distance((8.5, 0, -19.5))[0], mode=Mode.SUBTRACT)

    # Fillet4
    fillet4_edges = [part.edges().sort_by_distance(p)[0] for p in [
        (14, 0.75, -11),
        (25, 0.75, -11),
        (14, 0.75, 11),
        (25, 0.75, 11),
        (11, 0.75, -14),
        (11, 0.75, -25),
        (-11, 0.75, -14),
        (-11, 0.75, -25),
    ]]
    fillet(fillet4_edges, radius=FILLET4_R)

    # Mirror4: Cut-Extrude6 across plane
    add(cut_extrude6.mirror(Plane(origin=(0, 0, 0), x_dir=(0, 0, 1), z_dir=(1, 0, 0))), mode=Mode.SUBTRACT)

    # CirPattern14: Cut-Extrude6 ×4 about axis
    cirpattern14_axis = Axis((0, 0, 0), (0, 1, 0))
    for i in range(1, CIRPATTERN14_COUNT):
        add(cut_extrude6.rotate(cirpattern14_axis, i * 360 / CIRPATTERN14_COUNT), mode=Mode.SUBTRACT)

    # CirPattern14 copy 1 sketch → CirPattern14 copy 1 (cut)
    with BuildSketch(Plane(origin=(0, 0, 5), x_dir=(1, 0, 0), z_dir=(0, 0, -1))):
        with Locations((20, -6.35)):
            Rectangle(CIRPATTERN14_COPY_1_SKETCH_W, CIRPATTERN14_COPY_1_SKETCH_H)
    extrude(amount=-CIRPATTERN14_COPY_1_DEPTH, mode=Mode.SUBTRACT)

    # CirPattern14 copy 2 sketch → CirPattern14 copy 2 (cut)
    with BuildSketch(Plane(origin=(5, 0, 0), x_dir=(0, 0, -1), z_dir=(-1, 0, 0))):
        with Locations((20, -6.35)):
            Rectangle(CIRPATTERN14_COPY_2_SKETCH_W, CIRPATTERN14_COPY_2_SKETCH_H)
    extrude(amount=-CIRPATTERN14_COPY_2_DEPTH, mode=Mode.SUBTRACT)

    # CirPattern14 copy 3 sketch → CirPattern14 copy 3 (cut)
    with BuildSketch(Plane(origin=(0, 0, -5), x_dir=(-1, 0, 0), z_dir=(0, 0, 1))):
        with Locations((20, -6.35)):
            Rectangle(CIRPATTERN14_COPY_3_SKETCH_W, CIRPATTERN14_COPY_3_SKETCH_H)
    extrude(amount=-CIRPATTERN14_COPY_3_DEPTH, mode=Mode.SUBTRACT)

    # Chamfer2: read off the stored shape, not the designer's step
    # Chamfer2 outline → Chamfer2 (cut)
    with BuildSketch(Plane.YZ.offset(CHAMFER2_START)):
        with BuildLine():
            Line((5.5, 2.507987241), (5.5, 2.818415652))
            Line((5.5, 2.818415652), (4.974212995, 2.227548881))
            ThreePointArc((4.974212995, 2.227548881), (5.229346067, 2.382317902), (5.5, 2.507987241))
        make_face()
        with BuildLine():
            ThreePointArc((5.5, -2.507987241), (5.229346067, -2.382317902), (4.974212995, -2.227548881))
            Line((4.974212995, -2.227548881), (5.5, -2.818415652))
            Line((5.5, -2.818415652), (5.5, -2.507987241))
        make_face()
    extrude(amount=CHAMFER2_DEPTH, mode=Mode.SUBTRACT)

    # Chamfer2 2 outline → Chamfer2 2 (cut)
    with BuildSketch(Plane.XY.offset(CHAMFER2_START)):
        with BuildLine():
            ThreePointArc((2.670205985, 5.5), (2.629105515, 5.285342215), (2.570778016, 5.074711932))
            Line((2.570778016, 5.074711932), (3.145933741, 5.5))
            Line((3.145933741, 5.5), (2.670205985, 5.5))
        make_face()
        with BuildLine():
            Line((-3.145933741, 5.5), (-2.570778016, 5.074711932))
            ThreePointArc((-2.570778016, 5.074711932), (-2.629105515, 5.285342215), (-2.670205985, 5.5))
            Line((-2.670205985, 5.5), (-3.145933741, 5.5))
        make_face()
    extrude(amount=CHAMFER2_2_DEPTH, mode=Mode.SUBTRACT)


solid = part.part
